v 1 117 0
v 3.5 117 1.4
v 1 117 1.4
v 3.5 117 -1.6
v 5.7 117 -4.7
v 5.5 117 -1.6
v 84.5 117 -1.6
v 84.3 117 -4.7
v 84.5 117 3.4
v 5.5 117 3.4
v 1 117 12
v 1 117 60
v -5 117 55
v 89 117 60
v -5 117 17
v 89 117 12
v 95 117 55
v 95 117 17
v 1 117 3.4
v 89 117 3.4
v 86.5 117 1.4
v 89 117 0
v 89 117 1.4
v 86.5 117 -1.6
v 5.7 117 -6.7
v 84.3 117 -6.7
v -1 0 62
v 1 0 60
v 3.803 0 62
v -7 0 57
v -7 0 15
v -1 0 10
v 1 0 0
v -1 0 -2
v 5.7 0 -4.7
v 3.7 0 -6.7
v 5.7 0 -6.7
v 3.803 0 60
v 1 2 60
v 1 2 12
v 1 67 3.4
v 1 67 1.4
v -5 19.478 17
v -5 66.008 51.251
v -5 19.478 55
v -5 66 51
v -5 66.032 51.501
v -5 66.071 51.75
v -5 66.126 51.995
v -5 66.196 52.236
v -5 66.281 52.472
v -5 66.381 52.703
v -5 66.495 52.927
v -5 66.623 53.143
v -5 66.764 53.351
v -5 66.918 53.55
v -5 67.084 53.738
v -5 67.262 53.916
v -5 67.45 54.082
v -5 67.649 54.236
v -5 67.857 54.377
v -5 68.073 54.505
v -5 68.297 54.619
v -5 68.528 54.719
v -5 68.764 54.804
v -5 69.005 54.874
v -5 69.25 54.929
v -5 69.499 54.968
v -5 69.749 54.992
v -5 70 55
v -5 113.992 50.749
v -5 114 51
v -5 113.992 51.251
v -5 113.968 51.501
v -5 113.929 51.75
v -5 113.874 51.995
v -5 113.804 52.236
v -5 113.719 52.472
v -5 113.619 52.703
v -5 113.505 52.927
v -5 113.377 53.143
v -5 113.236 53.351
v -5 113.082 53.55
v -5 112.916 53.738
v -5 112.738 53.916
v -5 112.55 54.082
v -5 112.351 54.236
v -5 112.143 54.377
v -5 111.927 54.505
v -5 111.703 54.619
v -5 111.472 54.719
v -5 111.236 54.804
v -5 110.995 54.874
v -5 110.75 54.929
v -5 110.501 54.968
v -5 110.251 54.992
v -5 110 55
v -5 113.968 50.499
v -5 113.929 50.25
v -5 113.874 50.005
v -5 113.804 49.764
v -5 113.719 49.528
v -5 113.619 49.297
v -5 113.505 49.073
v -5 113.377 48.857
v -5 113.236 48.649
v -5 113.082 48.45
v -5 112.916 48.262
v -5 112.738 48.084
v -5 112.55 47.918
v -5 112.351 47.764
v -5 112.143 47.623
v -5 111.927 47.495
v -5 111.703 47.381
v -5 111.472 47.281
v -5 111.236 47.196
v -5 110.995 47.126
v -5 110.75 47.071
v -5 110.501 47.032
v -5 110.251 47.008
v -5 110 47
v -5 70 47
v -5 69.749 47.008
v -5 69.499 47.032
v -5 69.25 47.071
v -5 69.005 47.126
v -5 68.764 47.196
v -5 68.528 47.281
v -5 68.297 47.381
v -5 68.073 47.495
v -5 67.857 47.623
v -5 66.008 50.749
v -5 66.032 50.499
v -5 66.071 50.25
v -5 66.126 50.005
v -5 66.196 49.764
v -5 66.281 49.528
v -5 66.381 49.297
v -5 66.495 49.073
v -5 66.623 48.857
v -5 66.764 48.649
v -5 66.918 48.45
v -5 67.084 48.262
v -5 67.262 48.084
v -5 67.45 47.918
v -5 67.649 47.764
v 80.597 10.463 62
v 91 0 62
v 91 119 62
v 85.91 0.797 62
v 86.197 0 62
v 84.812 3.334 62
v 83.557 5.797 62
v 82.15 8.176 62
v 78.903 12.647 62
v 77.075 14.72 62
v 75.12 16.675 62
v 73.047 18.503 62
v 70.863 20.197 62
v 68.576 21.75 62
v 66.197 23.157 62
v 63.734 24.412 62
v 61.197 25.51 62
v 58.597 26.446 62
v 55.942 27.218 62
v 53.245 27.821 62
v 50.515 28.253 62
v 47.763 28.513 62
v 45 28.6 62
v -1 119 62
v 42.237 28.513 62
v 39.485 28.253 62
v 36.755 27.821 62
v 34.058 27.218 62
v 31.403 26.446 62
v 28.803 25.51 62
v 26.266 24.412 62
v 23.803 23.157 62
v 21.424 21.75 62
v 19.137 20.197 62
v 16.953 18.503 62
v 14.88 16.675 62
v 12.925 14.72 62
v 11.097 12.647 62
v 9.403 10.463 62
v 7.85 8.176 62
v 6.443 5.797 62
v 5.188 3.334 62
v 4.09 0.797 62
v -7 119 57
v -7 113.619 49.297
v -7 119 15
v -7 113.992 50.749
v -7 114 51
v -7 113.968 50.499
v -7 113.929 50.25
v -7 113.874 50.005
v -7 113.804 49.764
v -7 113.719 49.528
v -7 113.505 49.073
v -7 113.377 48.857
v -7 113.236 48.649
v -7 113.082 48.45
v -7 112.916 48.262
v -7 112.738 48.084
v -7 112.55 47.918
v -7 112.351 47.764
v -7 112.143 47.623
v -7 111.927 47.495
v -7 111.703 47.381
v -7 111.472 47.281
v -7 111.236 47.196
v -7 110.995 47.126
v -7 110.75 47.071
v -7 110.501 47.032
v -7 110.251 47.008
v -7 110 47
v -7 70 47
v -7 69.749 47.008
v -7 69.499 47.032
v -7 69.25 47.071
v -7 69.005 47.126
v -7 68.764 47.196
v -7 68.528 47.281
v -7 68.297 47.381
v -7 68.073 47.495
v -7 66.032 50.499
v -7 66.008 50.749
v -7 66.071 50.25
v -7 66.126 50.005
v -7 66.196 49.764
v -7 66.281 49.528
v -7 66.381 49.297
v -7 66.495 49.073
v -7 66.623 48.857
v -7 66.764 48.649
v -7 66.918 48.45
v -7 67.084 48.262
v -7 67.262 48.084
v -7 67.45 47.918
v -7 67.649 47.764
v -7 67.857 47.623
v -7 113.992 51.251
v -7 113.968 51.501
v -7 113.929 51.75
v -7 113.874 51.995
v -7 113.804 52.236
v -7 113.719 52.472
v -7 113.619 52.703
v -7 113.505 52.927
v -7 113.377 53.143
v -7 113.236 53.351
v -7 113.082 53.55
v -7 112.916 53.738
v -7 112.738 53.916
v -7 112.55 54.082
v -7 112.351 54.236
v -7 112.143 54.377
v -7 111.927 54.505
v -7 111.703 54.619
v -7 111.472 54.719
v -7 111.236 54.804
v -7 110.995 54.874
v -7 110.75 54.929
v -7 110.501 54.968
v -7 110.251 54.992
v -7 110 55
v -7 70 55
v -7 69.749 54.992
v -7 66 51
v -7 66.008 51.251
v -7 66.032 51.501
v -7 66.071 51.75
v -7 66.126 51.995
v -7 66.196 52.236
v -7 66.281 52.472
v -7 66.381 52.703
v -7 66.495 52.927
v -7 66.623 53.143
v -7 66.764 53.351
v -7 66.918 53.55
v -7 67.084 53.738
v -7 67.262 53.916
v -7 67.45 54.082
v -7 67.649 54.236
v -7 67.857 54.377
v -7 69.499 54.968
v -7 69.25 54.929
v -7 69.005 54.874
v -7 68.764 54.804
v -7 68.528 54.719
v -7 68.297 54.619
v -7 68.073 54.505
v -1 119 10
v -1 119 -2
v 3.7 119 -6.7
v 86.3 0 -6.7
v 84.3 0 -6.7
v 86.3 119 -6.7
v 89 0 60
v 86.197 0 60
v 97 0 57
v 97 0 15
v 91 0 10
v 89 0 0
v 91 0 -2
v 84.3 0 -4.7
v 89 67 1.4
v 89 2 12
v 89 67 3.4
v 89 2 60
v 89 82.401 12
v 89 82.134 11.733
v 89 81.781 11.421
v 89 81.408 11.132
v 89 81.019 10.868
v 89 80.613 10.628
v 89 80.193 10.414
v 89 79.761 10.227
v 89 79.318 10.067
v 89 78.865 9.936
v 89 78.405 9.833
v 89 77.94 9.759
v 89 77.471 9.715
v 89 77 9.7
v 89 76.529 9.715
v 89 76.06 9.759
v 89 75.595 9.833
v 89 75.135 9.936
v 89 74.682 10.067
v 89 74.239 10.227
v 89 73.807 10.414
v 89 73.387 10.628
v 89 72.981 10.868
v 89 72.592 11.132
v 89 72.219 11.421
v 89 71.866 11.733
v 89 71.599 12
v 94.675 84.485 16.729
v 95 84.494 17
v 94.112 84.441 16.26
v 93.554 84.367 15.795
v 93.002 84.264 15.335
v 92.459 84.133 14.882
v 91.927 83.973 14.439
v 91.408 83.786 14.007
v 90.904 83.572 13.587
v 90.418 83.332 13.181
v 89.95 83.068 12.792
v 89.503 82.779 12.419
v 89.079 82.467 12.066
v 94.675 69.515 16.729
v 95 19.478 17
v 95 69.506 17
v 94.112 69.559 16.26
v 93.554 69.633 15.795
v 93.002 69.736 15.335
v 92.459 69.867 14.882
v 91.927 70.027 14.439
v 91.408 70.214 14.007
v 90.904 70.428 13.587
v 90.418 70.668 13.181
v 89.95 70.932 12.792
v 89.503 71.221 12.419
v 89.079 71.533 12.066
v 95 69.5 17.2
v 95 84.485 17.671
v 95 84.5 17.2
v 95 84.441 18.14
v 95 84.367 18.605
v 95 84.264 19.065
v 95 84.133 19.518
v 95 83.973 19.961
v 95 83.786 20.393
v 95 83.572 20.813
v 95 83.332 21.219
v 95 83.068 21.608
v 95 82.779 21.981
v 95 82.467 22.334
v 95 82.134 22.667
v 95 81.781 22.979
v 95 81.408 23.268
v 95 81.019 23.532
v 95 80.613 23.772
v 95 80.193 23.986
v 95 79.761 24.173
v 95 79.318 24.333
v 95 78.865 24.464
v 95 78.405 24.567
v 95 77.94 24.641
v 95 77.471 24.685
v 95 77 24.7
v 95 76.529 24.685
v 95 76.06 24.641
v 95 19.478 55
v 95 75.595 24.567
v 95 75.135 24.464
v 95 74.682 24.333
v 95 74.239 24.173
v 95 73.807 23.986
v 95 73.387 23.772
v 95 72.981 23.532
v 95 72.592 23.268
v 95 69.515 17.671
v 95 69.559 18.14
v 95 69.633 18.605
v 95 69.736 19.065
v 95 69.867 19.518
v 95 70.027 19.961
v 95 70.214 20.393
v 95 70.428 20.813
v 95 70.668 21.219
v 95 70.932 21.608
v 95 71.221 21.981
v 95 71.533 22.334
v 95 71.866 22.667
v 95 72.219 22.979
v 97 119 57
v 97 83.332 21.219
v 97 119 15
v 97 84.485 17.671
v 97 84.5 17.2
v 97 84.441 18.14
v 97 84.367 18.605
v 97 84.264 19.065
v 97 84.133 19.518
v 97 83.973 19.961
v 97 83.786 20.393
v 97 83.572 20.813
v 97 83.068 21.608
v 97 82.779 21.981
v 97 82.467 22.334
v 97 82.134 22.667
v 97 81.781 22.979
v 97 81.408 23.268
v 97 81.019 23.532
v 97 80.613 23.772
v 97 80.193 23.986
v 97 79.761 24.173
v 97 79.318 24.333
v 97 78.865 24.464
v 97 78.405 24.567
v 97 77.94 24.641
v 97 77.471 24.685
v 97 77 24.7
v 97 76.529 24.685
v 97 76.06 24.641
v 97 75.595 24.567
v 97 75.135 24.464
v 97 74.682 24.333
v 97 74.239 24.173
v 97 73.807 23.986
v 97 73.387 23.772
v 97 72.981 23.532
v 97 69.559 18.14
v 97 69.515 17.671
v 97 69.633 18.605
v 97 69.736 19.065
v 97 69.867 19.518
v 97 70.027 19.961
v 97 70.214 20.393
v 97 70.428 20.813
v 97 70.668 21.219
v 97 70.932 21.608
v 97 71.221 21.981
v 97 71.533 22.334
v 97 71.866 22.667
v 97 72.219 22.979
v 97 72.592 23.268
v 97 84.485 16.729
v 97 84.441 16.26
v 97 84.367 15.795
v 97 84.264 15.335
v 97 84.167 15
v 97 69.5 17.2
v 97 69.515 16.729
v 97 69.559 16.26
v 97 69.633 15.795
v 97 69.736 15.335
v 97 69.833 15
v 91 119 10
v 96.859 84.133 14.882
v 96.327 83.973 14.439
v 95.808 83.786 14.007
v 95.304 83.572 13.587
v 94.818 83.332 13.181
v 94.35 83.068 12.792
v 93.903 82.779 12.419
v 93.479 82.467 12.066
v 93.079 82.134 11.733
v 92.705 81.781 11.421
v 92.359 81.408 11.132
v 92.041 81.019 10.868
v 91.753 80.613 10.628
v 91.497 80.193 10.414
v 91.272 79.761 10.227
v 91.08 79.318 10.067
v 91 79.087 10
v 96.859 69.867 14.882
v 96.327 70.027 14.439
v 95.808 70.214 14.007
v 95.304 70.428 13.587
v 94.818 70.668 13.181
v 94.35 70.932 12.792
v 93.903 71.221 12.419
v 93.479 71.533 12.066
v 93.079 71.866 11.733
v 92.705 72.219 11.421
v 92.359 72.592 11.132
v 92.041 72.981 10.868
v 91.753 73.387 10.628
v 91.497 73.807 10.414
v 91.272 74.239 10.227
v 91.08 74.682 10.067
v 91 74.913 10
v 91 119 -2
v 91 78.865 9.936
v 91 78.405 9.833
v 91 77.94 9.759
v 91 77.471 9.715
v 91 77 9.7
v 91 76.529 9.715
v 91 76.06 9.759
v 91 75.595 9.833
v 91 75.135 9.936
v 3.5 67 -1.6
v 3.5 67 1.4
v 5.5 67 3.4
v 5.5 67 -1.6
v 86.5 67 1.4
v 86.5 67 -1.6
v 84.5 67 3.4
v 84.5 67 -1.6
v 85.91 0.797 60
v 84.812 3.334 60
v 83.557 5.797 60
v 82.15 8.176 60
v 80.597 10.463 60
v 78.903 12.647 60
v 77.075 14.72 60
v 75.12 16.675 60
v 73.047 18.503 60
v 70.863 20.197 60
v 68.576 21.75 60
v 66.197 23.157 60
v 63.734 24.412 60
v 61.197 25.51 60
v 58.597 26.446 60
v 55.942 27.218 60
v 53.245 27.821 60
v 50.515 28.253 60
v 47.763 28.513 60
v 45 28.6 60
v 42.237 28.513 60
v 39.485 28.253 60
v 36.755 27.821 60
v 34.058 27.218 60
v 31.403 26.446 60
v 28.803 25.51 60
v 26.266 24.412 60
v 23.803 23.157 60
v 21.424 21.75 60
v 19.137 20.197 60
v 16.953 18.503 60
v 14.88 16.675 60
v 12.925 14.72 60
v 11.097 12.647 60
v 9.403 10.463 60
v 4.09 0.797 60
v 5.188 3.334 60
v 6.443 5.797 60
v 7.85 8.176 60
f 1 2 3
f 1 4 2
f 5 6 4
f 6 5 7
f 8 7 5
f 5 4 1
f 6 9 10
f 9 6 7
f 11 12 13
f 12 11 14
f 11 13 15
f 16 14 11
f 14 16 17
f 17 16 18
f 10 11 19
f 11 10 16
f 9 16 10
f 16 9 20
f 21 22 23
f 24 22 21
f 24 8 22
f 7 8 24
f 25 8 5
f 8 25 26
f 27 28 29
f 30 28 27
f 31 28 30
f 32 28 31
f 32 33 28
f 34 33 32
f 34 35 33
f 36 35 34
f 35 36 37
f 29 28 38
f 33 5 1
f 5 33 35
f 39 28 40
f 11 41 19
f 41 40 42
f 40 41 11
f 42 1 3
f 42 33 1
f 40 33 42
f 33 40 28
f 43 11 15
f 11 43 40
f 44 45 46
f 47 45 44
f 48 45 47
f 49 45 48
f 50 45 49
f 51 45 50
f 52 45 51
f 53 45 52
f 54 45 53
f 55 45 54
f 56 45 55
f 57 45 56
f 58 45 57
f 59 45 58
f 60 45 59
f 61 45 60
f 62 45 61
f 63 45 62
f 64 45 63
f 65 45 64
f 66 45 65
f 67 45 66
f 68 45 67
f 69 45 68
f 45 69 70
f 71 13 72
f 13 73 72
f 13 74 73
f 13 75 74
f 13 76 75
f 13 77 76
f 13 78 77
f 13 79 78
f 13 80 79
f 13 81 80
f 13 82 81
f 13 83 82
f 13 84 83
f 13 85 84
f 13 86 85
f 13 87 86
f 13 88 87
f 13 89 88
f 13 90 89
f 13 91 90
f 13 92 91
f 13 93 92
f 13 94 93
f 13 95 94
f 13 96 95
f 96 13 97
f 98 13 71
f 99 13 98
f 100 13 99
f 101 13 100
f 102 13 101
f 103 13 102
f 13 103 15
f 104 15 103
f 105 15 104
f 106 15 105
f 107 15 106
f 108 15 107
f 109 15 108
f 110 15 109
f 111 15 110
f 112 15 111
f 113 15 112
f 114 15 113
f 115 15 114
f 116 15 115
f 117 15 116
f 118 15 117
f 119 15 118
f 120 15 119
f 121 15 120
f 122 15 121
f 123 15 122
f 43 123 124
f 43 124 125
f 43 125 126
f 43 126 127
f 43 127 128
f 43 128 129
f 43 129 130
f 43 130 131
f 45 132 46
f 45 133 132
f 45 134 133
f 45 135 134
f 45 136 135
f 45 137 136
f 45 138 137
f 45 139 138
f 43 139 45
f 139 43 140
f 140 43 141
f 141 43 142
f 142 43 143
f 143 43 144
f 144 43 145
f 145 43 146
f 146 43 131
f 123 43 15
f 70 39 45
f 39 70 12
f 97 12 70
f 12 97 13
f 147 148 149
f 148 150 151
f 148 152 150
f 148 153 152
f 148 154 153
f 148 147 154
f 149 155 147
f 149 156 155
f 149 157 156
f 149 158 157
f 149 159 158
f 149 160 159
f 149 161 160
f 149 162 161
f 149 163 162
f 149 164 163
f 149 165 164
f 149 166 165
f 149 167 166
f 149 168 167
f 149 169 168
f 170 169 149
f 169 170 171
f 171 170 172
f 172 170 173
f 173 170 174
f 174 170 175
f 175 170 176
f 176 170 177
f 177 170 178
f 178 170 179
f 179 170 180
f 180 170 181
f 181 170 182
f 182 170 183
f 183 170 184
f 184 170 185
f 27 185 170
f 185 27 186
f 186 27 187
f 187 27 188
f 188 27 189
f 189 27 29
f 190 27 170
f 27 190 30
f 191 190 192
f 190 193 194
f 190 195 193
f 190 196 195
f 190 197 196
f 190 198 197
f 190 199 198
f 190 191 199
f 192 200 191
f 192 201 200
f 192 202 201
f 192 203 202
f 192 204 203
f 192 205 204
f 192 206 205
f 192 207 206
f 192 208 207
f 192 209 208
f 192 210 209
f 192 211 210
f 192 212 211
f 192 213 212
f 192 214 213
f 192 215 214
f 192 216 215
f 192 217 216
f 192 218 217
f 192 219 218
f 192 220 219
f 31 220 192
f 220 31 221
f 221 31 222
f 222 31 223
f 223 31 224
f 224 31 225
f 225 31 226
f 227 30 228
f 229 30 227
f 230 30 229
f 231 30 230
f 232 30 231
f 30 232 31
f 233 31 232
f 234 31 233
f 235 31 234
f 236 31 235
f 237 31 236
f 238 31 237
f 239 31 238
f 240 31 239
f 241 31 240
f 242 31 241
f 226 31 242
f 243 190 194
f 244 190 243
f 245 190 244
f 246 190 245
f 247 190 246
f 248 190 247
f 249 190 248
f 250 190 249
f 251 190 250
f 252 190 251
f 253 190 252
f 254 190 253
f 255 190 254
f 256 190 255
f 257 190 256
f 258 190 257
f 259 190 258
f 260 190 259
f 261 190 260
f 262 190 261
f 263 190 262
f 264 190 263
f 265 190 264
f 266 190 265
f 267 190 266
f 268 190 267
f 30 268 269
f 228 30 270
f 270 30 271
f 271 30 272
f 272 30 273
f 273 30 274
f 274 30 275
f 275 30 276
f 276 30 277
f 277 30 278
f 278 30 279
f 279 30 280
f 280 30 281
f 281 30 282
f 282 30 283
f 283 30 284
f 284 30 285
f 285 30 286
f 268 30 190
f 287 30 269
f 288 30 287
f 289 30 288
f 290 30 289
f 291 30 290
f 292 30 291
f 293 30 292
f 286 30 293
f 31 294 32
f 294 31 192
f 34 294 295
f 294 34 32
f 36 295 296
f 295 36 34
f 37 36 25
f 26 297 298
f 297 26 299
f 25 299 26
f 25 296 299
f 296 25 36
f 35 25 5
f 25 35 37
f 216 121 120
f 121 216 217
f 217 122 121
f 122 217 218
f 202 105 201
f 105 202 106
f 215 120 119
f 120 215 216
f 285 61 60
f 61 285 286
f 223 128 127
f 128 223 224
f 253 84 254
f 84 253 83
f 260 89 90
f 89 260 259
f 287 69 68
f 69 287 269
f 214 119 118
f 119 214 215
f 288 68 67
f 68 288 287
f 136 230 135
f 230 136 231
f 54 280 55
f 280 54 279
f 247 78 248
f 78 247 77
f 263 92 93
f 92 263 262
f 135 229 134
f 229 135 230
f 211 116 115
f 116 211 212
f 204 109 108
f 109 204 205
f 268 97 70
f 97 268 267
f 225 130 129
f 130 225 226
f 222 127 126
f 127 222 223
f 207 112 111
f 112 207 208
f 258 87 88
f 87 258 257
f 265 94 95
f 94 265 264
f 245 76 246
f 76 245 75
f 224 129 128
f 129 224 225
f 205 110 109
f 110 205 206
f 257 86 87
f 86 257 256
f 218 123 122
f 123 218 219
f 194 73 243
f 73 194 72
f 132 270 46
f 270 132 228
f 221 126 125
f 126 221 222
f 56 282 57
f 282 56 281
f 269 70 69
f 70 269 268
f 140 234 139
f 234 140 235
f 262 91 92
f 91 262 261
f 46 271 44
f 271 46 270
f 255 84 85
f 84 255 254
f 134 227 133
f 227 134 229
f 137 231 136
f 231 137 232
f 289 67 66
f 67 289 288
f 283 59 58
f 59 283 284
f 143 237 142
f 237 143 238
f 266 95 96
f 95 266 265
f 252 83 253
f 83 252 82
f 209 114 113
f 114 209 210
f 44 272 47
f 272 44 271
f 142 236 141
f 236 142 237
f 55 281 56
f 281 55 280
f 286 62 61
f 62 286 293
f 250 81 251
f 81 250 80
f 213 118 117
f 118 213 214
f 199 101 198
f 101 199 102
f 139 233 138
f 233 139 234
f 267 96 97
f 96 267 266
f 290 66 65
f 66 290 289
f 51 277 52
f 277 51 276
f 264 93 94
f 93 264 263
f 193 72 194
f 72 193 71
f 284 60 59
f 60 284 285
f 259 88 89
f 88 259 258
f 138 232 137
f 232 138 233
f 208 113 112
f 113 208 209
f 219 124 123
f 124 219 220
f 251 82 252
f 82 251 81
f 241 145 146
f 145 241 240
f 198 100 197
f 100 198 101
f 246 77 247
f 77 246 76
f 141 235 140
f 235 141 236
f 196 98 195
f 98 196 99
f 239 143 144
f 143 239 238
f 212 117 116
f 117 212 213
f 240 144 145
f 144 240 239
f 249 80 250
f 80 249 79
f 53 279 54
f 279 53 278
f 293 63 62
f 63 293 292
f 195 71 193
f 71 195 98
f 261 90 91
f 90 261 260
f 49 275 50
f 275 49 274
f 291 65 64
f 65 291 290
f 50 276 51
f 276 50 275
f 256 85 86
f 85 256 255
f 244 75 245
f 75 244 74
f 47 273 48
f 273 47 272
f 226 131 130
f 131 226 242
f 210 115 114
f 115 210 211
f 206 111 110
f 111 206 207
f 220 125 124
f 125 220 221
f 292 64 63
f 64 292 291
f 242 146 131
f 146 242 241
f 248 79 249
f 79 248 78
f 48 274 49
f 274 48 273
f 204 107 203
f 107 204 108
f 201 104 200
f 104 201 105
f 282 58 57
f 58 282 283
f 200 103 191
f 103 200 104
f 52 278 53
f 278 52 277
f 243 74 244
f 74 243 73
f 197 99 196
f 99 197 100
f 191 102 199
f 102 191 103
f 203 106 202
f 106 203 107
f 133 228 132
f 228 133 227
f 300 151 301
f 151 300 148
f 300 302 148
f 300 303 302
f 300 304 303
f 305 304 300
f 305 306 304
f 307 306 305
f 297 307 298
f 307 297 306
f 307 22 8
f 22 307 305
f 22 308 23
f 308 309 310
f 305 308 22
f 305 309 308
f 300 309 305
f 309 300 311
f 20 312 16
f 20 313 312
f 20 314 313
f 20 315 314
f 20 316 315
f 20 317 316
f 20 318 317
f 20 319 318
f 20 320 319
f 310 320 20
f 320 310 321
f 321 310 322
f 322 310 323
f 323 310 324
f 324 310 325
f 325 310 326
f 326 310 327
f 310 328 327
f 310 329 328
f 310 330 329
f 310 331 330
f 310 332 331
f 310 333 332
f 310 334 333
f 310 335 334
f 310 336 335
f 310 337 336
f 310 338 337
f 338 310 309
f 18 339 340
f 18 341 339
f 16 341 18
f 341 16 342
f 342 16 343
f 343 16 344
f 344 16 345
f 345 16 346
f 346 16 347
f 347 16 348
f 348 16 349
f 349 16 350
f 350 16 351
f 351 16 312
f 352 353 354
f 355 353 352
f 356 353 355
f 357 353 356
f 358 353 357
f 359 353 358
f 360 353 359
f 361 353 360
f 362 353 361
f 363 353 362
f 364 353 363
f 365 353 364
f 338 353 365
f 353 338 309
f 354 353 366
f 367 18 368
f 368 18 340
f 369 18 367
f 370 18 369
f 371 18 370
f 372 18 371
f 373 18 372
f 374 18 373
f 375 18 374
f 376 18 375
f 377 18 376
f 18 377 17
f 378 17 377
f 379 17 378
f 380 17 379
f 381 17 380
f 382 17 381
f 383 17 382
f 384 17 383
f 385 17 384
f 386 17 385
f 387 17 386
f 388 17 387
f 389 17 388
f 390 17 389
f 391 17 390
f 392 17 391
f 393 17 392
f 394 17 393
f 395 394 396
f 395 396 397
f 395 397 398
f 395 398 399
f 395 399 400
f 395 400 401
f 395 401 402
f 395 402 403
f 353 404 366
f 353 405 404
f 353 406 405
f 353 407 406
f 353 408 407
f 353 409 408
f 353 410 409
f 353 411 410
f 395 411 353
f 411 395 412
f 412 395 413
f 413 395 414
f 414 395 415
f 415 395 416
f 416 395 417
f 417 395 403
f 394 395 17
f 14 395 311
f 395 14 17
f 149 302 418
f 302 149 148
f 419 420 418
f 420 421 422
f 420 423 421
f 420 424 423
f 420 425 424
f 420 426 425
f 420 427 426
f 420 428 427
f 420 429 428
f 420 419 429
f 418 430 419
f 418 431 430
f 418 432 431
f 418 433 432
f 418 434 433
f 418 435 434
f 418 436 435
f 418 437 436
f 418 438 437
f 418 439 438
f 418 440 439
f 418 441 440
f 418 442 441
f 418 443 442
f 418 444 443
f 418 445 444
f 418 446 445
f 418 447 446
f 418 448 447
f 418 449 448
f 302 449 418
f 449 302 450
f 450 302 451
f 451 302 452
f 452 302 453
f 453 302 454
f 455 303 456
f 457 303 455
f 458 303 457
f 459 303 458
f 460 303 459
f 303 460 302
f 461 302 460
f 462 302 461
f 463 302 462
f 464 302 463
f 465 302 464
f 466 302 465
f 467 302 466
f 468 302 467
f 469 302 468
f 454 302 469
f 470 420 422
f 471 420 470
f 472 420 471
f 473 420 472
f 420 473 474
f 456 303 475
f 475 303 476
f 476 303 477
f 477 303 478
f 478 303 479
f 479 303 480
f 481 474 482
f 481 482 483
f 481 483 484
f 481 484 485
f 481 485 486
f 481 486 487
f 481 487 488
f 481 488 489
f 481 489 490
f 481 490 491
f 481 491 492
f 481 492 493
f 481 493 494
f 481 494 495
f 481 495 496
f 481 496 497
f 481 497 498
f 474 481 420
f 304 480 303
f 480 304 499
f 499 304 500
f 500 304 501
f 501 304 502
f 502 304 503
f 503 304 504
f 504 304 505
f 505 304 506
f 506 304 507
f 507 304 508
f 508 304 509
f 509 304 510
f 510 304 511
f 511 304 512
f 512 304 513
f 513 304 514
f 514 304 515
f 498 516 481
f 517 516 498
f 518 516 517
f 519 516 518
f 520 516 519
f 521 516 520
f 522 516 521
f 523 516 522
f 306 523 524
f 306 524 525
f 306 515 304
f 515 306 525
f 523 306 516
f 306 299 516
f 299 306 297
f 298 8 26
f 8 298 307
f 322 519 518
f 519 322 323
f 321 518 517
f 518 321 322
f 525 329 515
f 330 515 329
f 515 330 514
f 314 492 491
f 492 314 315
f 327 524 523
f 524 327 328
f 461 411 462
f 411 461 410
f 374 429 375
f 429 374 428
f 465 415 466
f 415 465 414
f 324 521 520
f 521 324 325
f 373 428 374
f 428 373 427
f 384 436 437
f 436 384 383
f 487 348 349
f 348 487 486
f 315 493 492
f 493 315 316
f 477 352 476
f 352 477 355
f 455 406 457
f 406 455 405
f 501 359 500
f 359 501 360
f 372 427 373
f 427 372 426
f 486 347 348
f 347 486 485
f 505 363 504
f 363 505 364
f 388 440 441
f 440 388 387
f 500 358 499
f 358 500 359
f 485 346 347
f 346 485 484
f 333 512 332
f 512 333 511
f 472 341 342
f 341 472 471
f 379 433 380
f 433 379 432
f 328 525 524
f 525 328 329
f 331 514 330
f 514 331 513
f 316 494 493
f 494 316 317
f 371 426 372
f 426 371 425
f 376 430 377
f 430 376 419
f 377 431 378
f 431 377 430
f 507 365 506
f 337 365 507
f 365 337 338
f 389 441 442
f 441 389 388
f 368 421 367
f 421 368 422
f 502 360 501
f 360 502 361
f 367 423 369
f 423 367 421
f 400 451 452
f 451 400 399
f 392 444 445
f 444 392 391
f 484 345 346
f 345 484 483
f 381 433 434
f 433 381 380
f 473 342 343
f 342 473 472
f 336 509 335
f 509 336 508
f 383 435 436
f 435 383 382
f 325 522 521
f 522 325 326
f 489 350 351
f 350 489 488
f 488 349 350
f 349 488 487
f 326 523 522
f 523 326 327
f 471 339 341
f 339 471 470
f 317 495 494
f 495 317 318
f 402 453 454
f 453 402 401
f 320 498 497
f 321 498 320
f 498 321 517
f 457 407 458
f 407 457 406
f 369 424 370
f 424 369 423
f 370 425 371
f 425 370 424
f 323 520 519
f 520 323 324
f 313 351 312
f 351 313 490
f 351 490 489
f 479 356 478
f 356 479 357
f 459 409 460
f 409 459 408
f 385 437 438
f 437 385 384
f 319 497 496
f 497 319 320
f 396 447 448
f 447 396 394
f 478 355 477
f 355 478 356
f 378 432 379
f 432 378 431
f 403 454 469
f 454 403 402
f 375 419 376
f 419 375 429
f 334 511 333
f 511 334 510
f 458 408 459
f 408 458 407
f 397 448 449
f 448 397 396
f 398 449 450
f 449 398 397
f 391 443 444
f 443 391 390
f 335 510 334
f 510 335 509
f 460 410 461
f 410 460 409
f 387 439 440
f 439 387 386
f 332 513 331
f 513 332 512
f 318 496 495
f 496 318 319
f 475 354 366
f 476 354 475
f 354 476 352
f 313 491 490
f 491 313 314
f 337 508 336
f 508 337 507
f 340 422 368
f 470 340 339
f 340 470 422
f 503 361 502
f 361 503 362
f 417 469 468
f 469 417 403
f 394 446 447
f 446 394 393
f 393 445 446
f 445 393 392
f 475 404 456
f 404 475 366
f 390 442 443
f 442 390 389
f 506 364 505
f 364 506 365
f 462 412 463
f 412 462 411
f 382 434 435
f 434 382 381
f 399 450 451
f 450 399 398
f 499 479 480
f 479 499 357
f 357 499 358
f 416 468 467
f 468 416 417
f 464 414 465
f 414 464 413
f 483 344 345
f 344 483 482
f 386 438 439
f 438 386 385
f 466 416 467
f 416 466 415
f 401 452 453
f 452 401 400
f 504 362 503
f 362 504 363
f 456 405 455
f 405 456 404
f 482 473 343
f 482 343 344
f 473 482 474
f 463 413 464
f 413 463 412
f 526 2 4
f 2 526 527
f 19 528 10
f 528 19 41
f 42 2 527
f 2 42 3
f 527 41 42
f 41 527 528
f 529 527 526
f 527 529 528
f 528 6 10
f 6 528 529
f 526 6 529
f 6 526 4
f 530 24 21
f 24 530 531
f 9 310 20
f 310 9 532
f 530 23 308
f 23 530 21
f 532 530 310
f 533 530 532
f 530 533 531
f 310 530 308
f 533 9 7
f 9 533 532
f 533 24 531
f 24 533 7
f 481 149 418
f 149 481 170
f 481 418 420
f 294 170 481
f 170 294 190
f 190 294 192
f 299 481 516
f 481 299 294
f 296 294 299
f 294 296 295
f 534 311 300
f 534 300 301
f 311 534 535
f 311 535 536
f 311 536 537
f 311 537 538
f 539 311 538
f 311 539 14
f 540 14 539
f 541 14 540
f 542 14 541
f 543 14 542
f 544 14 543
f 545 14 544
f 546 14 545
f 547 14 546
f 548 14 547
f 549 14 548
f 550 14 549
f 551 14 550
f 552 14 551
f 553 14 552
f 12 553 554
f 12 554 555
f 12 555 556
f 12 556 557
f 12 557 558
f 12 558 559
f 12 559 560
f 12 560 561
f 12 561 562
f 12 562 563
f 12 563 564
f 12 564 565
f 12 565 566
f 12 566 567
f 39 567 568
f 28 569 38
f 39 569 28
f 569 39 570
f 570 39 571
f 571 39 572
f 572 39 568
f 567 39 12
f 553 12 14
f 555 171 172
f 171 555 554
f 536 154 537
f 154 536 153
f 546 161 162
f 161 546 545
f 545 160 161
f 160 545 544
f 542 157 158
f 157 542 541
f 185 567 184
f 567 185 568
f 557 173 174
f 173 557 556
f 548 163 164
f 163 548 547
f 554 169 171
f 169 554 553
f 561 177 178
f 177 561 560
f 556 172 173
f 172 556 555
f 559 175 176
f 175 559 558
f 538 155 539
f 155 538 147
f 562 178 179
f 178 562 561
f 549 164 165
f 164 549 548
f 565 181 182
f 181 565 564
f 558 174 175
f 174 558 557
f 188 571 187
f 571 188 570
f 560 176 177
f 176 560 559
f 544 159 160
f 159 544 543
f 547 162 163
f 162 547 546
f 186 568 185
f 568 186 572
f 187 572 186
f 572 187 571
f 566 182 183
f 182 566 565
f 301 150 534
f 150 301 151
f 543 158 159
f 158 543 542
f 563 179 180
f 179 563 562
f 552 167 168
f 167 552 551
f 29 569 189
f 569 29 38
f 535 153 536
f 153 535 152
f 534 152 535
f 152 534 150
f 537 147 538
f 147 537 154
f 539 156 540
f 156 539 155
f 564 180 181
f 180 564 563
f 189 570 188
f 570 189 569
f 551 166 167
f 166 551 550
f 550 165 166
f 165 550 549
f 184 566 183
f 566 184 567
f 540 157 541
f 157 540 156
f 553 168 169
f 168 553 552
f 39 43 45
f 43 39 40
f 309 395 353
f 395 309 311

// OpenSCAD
// file: ../../modules/copy_mirror.scad
module copy_mirror(uvec) {
  children();
  mirror(uvec) children();
}
// file: ../../modules/copy_translate.scad
module copy_translate(vec) {
  children();
  translate(vec) children();
}
// main file
use <../../modules/copy_translate.scad>
use <../../modules/copy_mirror.scad>

$fn = 100;

wall_thickness = 2;

difference() {
  // ref: https://en.wikibooks.org/wiki/OpenSCAD_User_Manual/FAQ#Why_are_some_parts_(e.g._holes)_of_the_model_not_rendered_correctly?
  render(convexity = 2) side_wall();

  translate([-7.1, 70, 51])
    rotate([0, 90])
    hull()
    copy_translate([0, 40])
    cylinder(r = 4, h = wall_thickness + 0.2);
}


translate([88 + wall_thickness, 0]) mirror([1, 0]) difference() {
  render(convexity = 2) side_wall();

  translate([-8, 77, 17.2]) rotate([0, 90]) cylinder(d = 15, h = 10);
}

front_wall();
translate([88 + wall_thickness, 0]) mirror([1, 0]) front_wall();

translate([0, 117 - 50, 1.4]) {
  side_rail(length = 50);
  translate([88 + wall_thickness, 0]) mirror([1, 0]) side_rail(length = 50);
}

translate([0, 117]) rear_wall();
translate([0, 0, 60]) top_wall();

module side_wall(t = wall_thickness) translate([-t / 2, 117])
  rotate([90, 0]) linear_extrude(height = 117) {
    side_wall_bottom_shape();
    side_wall_top_shape();
  };

module side_rail(length) {
  cube([3.5, length, 2]);
  translate([3.5, 0, 2 - 5]) cube([2, length, 5]);
}

module side_wall_bottom_shape(t = wall_thickness) {
  hull() copy_translate([0, 10]) square([t, t]);
  translate([0, -t]) hull() copy_translate([4.7, -4.7]) square([t, t]);
}

module side_wall_top_shape(t = wall_thickness) {
  translate([0, 10]) hull() copy_translate([-6, 5]) square([t, t]);
  translate([-6, 15]) hull() copy_translate([0, 40]) square([t, t]);
  translate([-6, 55]) hull() copy_translate([6, 5]) square([t, t]);
}

module rear_wall(t = wall_thickness) translate([-t / 2, t]) {
  rear_wall_transform() side_wall_bottom_shape();
  rear_wall_transform() side_wall_top_shape();
}

module rear_wall_transform(t = wall_thickness)
  translate([88 / 2 + t, 0])
  rotate([90, 0])
  linear_extrude(height = t)
  hull()
  copy_mirror([1, 0])
  translate([-88 / 2 - t, 0])
  children();

module top_wall(t = wall_thickness) translate([-t / 2, 0]) difference() {
  width = 88 + 2 * t;

  cube([width, 117, t]);
  translate([width / 2, -15.4, -0.1]) cylinder(r = 44, h = t + 0.2);
}

module front_wall(t = wall_thickness) translate([-t / 2, t]) hull() {
  rotate([90, 0]) linear_extrude(height = t) hull() side_wall_top_shape();
  translate([-5, 20, 15]) cube([0.1, 0.1, 40]);
}
